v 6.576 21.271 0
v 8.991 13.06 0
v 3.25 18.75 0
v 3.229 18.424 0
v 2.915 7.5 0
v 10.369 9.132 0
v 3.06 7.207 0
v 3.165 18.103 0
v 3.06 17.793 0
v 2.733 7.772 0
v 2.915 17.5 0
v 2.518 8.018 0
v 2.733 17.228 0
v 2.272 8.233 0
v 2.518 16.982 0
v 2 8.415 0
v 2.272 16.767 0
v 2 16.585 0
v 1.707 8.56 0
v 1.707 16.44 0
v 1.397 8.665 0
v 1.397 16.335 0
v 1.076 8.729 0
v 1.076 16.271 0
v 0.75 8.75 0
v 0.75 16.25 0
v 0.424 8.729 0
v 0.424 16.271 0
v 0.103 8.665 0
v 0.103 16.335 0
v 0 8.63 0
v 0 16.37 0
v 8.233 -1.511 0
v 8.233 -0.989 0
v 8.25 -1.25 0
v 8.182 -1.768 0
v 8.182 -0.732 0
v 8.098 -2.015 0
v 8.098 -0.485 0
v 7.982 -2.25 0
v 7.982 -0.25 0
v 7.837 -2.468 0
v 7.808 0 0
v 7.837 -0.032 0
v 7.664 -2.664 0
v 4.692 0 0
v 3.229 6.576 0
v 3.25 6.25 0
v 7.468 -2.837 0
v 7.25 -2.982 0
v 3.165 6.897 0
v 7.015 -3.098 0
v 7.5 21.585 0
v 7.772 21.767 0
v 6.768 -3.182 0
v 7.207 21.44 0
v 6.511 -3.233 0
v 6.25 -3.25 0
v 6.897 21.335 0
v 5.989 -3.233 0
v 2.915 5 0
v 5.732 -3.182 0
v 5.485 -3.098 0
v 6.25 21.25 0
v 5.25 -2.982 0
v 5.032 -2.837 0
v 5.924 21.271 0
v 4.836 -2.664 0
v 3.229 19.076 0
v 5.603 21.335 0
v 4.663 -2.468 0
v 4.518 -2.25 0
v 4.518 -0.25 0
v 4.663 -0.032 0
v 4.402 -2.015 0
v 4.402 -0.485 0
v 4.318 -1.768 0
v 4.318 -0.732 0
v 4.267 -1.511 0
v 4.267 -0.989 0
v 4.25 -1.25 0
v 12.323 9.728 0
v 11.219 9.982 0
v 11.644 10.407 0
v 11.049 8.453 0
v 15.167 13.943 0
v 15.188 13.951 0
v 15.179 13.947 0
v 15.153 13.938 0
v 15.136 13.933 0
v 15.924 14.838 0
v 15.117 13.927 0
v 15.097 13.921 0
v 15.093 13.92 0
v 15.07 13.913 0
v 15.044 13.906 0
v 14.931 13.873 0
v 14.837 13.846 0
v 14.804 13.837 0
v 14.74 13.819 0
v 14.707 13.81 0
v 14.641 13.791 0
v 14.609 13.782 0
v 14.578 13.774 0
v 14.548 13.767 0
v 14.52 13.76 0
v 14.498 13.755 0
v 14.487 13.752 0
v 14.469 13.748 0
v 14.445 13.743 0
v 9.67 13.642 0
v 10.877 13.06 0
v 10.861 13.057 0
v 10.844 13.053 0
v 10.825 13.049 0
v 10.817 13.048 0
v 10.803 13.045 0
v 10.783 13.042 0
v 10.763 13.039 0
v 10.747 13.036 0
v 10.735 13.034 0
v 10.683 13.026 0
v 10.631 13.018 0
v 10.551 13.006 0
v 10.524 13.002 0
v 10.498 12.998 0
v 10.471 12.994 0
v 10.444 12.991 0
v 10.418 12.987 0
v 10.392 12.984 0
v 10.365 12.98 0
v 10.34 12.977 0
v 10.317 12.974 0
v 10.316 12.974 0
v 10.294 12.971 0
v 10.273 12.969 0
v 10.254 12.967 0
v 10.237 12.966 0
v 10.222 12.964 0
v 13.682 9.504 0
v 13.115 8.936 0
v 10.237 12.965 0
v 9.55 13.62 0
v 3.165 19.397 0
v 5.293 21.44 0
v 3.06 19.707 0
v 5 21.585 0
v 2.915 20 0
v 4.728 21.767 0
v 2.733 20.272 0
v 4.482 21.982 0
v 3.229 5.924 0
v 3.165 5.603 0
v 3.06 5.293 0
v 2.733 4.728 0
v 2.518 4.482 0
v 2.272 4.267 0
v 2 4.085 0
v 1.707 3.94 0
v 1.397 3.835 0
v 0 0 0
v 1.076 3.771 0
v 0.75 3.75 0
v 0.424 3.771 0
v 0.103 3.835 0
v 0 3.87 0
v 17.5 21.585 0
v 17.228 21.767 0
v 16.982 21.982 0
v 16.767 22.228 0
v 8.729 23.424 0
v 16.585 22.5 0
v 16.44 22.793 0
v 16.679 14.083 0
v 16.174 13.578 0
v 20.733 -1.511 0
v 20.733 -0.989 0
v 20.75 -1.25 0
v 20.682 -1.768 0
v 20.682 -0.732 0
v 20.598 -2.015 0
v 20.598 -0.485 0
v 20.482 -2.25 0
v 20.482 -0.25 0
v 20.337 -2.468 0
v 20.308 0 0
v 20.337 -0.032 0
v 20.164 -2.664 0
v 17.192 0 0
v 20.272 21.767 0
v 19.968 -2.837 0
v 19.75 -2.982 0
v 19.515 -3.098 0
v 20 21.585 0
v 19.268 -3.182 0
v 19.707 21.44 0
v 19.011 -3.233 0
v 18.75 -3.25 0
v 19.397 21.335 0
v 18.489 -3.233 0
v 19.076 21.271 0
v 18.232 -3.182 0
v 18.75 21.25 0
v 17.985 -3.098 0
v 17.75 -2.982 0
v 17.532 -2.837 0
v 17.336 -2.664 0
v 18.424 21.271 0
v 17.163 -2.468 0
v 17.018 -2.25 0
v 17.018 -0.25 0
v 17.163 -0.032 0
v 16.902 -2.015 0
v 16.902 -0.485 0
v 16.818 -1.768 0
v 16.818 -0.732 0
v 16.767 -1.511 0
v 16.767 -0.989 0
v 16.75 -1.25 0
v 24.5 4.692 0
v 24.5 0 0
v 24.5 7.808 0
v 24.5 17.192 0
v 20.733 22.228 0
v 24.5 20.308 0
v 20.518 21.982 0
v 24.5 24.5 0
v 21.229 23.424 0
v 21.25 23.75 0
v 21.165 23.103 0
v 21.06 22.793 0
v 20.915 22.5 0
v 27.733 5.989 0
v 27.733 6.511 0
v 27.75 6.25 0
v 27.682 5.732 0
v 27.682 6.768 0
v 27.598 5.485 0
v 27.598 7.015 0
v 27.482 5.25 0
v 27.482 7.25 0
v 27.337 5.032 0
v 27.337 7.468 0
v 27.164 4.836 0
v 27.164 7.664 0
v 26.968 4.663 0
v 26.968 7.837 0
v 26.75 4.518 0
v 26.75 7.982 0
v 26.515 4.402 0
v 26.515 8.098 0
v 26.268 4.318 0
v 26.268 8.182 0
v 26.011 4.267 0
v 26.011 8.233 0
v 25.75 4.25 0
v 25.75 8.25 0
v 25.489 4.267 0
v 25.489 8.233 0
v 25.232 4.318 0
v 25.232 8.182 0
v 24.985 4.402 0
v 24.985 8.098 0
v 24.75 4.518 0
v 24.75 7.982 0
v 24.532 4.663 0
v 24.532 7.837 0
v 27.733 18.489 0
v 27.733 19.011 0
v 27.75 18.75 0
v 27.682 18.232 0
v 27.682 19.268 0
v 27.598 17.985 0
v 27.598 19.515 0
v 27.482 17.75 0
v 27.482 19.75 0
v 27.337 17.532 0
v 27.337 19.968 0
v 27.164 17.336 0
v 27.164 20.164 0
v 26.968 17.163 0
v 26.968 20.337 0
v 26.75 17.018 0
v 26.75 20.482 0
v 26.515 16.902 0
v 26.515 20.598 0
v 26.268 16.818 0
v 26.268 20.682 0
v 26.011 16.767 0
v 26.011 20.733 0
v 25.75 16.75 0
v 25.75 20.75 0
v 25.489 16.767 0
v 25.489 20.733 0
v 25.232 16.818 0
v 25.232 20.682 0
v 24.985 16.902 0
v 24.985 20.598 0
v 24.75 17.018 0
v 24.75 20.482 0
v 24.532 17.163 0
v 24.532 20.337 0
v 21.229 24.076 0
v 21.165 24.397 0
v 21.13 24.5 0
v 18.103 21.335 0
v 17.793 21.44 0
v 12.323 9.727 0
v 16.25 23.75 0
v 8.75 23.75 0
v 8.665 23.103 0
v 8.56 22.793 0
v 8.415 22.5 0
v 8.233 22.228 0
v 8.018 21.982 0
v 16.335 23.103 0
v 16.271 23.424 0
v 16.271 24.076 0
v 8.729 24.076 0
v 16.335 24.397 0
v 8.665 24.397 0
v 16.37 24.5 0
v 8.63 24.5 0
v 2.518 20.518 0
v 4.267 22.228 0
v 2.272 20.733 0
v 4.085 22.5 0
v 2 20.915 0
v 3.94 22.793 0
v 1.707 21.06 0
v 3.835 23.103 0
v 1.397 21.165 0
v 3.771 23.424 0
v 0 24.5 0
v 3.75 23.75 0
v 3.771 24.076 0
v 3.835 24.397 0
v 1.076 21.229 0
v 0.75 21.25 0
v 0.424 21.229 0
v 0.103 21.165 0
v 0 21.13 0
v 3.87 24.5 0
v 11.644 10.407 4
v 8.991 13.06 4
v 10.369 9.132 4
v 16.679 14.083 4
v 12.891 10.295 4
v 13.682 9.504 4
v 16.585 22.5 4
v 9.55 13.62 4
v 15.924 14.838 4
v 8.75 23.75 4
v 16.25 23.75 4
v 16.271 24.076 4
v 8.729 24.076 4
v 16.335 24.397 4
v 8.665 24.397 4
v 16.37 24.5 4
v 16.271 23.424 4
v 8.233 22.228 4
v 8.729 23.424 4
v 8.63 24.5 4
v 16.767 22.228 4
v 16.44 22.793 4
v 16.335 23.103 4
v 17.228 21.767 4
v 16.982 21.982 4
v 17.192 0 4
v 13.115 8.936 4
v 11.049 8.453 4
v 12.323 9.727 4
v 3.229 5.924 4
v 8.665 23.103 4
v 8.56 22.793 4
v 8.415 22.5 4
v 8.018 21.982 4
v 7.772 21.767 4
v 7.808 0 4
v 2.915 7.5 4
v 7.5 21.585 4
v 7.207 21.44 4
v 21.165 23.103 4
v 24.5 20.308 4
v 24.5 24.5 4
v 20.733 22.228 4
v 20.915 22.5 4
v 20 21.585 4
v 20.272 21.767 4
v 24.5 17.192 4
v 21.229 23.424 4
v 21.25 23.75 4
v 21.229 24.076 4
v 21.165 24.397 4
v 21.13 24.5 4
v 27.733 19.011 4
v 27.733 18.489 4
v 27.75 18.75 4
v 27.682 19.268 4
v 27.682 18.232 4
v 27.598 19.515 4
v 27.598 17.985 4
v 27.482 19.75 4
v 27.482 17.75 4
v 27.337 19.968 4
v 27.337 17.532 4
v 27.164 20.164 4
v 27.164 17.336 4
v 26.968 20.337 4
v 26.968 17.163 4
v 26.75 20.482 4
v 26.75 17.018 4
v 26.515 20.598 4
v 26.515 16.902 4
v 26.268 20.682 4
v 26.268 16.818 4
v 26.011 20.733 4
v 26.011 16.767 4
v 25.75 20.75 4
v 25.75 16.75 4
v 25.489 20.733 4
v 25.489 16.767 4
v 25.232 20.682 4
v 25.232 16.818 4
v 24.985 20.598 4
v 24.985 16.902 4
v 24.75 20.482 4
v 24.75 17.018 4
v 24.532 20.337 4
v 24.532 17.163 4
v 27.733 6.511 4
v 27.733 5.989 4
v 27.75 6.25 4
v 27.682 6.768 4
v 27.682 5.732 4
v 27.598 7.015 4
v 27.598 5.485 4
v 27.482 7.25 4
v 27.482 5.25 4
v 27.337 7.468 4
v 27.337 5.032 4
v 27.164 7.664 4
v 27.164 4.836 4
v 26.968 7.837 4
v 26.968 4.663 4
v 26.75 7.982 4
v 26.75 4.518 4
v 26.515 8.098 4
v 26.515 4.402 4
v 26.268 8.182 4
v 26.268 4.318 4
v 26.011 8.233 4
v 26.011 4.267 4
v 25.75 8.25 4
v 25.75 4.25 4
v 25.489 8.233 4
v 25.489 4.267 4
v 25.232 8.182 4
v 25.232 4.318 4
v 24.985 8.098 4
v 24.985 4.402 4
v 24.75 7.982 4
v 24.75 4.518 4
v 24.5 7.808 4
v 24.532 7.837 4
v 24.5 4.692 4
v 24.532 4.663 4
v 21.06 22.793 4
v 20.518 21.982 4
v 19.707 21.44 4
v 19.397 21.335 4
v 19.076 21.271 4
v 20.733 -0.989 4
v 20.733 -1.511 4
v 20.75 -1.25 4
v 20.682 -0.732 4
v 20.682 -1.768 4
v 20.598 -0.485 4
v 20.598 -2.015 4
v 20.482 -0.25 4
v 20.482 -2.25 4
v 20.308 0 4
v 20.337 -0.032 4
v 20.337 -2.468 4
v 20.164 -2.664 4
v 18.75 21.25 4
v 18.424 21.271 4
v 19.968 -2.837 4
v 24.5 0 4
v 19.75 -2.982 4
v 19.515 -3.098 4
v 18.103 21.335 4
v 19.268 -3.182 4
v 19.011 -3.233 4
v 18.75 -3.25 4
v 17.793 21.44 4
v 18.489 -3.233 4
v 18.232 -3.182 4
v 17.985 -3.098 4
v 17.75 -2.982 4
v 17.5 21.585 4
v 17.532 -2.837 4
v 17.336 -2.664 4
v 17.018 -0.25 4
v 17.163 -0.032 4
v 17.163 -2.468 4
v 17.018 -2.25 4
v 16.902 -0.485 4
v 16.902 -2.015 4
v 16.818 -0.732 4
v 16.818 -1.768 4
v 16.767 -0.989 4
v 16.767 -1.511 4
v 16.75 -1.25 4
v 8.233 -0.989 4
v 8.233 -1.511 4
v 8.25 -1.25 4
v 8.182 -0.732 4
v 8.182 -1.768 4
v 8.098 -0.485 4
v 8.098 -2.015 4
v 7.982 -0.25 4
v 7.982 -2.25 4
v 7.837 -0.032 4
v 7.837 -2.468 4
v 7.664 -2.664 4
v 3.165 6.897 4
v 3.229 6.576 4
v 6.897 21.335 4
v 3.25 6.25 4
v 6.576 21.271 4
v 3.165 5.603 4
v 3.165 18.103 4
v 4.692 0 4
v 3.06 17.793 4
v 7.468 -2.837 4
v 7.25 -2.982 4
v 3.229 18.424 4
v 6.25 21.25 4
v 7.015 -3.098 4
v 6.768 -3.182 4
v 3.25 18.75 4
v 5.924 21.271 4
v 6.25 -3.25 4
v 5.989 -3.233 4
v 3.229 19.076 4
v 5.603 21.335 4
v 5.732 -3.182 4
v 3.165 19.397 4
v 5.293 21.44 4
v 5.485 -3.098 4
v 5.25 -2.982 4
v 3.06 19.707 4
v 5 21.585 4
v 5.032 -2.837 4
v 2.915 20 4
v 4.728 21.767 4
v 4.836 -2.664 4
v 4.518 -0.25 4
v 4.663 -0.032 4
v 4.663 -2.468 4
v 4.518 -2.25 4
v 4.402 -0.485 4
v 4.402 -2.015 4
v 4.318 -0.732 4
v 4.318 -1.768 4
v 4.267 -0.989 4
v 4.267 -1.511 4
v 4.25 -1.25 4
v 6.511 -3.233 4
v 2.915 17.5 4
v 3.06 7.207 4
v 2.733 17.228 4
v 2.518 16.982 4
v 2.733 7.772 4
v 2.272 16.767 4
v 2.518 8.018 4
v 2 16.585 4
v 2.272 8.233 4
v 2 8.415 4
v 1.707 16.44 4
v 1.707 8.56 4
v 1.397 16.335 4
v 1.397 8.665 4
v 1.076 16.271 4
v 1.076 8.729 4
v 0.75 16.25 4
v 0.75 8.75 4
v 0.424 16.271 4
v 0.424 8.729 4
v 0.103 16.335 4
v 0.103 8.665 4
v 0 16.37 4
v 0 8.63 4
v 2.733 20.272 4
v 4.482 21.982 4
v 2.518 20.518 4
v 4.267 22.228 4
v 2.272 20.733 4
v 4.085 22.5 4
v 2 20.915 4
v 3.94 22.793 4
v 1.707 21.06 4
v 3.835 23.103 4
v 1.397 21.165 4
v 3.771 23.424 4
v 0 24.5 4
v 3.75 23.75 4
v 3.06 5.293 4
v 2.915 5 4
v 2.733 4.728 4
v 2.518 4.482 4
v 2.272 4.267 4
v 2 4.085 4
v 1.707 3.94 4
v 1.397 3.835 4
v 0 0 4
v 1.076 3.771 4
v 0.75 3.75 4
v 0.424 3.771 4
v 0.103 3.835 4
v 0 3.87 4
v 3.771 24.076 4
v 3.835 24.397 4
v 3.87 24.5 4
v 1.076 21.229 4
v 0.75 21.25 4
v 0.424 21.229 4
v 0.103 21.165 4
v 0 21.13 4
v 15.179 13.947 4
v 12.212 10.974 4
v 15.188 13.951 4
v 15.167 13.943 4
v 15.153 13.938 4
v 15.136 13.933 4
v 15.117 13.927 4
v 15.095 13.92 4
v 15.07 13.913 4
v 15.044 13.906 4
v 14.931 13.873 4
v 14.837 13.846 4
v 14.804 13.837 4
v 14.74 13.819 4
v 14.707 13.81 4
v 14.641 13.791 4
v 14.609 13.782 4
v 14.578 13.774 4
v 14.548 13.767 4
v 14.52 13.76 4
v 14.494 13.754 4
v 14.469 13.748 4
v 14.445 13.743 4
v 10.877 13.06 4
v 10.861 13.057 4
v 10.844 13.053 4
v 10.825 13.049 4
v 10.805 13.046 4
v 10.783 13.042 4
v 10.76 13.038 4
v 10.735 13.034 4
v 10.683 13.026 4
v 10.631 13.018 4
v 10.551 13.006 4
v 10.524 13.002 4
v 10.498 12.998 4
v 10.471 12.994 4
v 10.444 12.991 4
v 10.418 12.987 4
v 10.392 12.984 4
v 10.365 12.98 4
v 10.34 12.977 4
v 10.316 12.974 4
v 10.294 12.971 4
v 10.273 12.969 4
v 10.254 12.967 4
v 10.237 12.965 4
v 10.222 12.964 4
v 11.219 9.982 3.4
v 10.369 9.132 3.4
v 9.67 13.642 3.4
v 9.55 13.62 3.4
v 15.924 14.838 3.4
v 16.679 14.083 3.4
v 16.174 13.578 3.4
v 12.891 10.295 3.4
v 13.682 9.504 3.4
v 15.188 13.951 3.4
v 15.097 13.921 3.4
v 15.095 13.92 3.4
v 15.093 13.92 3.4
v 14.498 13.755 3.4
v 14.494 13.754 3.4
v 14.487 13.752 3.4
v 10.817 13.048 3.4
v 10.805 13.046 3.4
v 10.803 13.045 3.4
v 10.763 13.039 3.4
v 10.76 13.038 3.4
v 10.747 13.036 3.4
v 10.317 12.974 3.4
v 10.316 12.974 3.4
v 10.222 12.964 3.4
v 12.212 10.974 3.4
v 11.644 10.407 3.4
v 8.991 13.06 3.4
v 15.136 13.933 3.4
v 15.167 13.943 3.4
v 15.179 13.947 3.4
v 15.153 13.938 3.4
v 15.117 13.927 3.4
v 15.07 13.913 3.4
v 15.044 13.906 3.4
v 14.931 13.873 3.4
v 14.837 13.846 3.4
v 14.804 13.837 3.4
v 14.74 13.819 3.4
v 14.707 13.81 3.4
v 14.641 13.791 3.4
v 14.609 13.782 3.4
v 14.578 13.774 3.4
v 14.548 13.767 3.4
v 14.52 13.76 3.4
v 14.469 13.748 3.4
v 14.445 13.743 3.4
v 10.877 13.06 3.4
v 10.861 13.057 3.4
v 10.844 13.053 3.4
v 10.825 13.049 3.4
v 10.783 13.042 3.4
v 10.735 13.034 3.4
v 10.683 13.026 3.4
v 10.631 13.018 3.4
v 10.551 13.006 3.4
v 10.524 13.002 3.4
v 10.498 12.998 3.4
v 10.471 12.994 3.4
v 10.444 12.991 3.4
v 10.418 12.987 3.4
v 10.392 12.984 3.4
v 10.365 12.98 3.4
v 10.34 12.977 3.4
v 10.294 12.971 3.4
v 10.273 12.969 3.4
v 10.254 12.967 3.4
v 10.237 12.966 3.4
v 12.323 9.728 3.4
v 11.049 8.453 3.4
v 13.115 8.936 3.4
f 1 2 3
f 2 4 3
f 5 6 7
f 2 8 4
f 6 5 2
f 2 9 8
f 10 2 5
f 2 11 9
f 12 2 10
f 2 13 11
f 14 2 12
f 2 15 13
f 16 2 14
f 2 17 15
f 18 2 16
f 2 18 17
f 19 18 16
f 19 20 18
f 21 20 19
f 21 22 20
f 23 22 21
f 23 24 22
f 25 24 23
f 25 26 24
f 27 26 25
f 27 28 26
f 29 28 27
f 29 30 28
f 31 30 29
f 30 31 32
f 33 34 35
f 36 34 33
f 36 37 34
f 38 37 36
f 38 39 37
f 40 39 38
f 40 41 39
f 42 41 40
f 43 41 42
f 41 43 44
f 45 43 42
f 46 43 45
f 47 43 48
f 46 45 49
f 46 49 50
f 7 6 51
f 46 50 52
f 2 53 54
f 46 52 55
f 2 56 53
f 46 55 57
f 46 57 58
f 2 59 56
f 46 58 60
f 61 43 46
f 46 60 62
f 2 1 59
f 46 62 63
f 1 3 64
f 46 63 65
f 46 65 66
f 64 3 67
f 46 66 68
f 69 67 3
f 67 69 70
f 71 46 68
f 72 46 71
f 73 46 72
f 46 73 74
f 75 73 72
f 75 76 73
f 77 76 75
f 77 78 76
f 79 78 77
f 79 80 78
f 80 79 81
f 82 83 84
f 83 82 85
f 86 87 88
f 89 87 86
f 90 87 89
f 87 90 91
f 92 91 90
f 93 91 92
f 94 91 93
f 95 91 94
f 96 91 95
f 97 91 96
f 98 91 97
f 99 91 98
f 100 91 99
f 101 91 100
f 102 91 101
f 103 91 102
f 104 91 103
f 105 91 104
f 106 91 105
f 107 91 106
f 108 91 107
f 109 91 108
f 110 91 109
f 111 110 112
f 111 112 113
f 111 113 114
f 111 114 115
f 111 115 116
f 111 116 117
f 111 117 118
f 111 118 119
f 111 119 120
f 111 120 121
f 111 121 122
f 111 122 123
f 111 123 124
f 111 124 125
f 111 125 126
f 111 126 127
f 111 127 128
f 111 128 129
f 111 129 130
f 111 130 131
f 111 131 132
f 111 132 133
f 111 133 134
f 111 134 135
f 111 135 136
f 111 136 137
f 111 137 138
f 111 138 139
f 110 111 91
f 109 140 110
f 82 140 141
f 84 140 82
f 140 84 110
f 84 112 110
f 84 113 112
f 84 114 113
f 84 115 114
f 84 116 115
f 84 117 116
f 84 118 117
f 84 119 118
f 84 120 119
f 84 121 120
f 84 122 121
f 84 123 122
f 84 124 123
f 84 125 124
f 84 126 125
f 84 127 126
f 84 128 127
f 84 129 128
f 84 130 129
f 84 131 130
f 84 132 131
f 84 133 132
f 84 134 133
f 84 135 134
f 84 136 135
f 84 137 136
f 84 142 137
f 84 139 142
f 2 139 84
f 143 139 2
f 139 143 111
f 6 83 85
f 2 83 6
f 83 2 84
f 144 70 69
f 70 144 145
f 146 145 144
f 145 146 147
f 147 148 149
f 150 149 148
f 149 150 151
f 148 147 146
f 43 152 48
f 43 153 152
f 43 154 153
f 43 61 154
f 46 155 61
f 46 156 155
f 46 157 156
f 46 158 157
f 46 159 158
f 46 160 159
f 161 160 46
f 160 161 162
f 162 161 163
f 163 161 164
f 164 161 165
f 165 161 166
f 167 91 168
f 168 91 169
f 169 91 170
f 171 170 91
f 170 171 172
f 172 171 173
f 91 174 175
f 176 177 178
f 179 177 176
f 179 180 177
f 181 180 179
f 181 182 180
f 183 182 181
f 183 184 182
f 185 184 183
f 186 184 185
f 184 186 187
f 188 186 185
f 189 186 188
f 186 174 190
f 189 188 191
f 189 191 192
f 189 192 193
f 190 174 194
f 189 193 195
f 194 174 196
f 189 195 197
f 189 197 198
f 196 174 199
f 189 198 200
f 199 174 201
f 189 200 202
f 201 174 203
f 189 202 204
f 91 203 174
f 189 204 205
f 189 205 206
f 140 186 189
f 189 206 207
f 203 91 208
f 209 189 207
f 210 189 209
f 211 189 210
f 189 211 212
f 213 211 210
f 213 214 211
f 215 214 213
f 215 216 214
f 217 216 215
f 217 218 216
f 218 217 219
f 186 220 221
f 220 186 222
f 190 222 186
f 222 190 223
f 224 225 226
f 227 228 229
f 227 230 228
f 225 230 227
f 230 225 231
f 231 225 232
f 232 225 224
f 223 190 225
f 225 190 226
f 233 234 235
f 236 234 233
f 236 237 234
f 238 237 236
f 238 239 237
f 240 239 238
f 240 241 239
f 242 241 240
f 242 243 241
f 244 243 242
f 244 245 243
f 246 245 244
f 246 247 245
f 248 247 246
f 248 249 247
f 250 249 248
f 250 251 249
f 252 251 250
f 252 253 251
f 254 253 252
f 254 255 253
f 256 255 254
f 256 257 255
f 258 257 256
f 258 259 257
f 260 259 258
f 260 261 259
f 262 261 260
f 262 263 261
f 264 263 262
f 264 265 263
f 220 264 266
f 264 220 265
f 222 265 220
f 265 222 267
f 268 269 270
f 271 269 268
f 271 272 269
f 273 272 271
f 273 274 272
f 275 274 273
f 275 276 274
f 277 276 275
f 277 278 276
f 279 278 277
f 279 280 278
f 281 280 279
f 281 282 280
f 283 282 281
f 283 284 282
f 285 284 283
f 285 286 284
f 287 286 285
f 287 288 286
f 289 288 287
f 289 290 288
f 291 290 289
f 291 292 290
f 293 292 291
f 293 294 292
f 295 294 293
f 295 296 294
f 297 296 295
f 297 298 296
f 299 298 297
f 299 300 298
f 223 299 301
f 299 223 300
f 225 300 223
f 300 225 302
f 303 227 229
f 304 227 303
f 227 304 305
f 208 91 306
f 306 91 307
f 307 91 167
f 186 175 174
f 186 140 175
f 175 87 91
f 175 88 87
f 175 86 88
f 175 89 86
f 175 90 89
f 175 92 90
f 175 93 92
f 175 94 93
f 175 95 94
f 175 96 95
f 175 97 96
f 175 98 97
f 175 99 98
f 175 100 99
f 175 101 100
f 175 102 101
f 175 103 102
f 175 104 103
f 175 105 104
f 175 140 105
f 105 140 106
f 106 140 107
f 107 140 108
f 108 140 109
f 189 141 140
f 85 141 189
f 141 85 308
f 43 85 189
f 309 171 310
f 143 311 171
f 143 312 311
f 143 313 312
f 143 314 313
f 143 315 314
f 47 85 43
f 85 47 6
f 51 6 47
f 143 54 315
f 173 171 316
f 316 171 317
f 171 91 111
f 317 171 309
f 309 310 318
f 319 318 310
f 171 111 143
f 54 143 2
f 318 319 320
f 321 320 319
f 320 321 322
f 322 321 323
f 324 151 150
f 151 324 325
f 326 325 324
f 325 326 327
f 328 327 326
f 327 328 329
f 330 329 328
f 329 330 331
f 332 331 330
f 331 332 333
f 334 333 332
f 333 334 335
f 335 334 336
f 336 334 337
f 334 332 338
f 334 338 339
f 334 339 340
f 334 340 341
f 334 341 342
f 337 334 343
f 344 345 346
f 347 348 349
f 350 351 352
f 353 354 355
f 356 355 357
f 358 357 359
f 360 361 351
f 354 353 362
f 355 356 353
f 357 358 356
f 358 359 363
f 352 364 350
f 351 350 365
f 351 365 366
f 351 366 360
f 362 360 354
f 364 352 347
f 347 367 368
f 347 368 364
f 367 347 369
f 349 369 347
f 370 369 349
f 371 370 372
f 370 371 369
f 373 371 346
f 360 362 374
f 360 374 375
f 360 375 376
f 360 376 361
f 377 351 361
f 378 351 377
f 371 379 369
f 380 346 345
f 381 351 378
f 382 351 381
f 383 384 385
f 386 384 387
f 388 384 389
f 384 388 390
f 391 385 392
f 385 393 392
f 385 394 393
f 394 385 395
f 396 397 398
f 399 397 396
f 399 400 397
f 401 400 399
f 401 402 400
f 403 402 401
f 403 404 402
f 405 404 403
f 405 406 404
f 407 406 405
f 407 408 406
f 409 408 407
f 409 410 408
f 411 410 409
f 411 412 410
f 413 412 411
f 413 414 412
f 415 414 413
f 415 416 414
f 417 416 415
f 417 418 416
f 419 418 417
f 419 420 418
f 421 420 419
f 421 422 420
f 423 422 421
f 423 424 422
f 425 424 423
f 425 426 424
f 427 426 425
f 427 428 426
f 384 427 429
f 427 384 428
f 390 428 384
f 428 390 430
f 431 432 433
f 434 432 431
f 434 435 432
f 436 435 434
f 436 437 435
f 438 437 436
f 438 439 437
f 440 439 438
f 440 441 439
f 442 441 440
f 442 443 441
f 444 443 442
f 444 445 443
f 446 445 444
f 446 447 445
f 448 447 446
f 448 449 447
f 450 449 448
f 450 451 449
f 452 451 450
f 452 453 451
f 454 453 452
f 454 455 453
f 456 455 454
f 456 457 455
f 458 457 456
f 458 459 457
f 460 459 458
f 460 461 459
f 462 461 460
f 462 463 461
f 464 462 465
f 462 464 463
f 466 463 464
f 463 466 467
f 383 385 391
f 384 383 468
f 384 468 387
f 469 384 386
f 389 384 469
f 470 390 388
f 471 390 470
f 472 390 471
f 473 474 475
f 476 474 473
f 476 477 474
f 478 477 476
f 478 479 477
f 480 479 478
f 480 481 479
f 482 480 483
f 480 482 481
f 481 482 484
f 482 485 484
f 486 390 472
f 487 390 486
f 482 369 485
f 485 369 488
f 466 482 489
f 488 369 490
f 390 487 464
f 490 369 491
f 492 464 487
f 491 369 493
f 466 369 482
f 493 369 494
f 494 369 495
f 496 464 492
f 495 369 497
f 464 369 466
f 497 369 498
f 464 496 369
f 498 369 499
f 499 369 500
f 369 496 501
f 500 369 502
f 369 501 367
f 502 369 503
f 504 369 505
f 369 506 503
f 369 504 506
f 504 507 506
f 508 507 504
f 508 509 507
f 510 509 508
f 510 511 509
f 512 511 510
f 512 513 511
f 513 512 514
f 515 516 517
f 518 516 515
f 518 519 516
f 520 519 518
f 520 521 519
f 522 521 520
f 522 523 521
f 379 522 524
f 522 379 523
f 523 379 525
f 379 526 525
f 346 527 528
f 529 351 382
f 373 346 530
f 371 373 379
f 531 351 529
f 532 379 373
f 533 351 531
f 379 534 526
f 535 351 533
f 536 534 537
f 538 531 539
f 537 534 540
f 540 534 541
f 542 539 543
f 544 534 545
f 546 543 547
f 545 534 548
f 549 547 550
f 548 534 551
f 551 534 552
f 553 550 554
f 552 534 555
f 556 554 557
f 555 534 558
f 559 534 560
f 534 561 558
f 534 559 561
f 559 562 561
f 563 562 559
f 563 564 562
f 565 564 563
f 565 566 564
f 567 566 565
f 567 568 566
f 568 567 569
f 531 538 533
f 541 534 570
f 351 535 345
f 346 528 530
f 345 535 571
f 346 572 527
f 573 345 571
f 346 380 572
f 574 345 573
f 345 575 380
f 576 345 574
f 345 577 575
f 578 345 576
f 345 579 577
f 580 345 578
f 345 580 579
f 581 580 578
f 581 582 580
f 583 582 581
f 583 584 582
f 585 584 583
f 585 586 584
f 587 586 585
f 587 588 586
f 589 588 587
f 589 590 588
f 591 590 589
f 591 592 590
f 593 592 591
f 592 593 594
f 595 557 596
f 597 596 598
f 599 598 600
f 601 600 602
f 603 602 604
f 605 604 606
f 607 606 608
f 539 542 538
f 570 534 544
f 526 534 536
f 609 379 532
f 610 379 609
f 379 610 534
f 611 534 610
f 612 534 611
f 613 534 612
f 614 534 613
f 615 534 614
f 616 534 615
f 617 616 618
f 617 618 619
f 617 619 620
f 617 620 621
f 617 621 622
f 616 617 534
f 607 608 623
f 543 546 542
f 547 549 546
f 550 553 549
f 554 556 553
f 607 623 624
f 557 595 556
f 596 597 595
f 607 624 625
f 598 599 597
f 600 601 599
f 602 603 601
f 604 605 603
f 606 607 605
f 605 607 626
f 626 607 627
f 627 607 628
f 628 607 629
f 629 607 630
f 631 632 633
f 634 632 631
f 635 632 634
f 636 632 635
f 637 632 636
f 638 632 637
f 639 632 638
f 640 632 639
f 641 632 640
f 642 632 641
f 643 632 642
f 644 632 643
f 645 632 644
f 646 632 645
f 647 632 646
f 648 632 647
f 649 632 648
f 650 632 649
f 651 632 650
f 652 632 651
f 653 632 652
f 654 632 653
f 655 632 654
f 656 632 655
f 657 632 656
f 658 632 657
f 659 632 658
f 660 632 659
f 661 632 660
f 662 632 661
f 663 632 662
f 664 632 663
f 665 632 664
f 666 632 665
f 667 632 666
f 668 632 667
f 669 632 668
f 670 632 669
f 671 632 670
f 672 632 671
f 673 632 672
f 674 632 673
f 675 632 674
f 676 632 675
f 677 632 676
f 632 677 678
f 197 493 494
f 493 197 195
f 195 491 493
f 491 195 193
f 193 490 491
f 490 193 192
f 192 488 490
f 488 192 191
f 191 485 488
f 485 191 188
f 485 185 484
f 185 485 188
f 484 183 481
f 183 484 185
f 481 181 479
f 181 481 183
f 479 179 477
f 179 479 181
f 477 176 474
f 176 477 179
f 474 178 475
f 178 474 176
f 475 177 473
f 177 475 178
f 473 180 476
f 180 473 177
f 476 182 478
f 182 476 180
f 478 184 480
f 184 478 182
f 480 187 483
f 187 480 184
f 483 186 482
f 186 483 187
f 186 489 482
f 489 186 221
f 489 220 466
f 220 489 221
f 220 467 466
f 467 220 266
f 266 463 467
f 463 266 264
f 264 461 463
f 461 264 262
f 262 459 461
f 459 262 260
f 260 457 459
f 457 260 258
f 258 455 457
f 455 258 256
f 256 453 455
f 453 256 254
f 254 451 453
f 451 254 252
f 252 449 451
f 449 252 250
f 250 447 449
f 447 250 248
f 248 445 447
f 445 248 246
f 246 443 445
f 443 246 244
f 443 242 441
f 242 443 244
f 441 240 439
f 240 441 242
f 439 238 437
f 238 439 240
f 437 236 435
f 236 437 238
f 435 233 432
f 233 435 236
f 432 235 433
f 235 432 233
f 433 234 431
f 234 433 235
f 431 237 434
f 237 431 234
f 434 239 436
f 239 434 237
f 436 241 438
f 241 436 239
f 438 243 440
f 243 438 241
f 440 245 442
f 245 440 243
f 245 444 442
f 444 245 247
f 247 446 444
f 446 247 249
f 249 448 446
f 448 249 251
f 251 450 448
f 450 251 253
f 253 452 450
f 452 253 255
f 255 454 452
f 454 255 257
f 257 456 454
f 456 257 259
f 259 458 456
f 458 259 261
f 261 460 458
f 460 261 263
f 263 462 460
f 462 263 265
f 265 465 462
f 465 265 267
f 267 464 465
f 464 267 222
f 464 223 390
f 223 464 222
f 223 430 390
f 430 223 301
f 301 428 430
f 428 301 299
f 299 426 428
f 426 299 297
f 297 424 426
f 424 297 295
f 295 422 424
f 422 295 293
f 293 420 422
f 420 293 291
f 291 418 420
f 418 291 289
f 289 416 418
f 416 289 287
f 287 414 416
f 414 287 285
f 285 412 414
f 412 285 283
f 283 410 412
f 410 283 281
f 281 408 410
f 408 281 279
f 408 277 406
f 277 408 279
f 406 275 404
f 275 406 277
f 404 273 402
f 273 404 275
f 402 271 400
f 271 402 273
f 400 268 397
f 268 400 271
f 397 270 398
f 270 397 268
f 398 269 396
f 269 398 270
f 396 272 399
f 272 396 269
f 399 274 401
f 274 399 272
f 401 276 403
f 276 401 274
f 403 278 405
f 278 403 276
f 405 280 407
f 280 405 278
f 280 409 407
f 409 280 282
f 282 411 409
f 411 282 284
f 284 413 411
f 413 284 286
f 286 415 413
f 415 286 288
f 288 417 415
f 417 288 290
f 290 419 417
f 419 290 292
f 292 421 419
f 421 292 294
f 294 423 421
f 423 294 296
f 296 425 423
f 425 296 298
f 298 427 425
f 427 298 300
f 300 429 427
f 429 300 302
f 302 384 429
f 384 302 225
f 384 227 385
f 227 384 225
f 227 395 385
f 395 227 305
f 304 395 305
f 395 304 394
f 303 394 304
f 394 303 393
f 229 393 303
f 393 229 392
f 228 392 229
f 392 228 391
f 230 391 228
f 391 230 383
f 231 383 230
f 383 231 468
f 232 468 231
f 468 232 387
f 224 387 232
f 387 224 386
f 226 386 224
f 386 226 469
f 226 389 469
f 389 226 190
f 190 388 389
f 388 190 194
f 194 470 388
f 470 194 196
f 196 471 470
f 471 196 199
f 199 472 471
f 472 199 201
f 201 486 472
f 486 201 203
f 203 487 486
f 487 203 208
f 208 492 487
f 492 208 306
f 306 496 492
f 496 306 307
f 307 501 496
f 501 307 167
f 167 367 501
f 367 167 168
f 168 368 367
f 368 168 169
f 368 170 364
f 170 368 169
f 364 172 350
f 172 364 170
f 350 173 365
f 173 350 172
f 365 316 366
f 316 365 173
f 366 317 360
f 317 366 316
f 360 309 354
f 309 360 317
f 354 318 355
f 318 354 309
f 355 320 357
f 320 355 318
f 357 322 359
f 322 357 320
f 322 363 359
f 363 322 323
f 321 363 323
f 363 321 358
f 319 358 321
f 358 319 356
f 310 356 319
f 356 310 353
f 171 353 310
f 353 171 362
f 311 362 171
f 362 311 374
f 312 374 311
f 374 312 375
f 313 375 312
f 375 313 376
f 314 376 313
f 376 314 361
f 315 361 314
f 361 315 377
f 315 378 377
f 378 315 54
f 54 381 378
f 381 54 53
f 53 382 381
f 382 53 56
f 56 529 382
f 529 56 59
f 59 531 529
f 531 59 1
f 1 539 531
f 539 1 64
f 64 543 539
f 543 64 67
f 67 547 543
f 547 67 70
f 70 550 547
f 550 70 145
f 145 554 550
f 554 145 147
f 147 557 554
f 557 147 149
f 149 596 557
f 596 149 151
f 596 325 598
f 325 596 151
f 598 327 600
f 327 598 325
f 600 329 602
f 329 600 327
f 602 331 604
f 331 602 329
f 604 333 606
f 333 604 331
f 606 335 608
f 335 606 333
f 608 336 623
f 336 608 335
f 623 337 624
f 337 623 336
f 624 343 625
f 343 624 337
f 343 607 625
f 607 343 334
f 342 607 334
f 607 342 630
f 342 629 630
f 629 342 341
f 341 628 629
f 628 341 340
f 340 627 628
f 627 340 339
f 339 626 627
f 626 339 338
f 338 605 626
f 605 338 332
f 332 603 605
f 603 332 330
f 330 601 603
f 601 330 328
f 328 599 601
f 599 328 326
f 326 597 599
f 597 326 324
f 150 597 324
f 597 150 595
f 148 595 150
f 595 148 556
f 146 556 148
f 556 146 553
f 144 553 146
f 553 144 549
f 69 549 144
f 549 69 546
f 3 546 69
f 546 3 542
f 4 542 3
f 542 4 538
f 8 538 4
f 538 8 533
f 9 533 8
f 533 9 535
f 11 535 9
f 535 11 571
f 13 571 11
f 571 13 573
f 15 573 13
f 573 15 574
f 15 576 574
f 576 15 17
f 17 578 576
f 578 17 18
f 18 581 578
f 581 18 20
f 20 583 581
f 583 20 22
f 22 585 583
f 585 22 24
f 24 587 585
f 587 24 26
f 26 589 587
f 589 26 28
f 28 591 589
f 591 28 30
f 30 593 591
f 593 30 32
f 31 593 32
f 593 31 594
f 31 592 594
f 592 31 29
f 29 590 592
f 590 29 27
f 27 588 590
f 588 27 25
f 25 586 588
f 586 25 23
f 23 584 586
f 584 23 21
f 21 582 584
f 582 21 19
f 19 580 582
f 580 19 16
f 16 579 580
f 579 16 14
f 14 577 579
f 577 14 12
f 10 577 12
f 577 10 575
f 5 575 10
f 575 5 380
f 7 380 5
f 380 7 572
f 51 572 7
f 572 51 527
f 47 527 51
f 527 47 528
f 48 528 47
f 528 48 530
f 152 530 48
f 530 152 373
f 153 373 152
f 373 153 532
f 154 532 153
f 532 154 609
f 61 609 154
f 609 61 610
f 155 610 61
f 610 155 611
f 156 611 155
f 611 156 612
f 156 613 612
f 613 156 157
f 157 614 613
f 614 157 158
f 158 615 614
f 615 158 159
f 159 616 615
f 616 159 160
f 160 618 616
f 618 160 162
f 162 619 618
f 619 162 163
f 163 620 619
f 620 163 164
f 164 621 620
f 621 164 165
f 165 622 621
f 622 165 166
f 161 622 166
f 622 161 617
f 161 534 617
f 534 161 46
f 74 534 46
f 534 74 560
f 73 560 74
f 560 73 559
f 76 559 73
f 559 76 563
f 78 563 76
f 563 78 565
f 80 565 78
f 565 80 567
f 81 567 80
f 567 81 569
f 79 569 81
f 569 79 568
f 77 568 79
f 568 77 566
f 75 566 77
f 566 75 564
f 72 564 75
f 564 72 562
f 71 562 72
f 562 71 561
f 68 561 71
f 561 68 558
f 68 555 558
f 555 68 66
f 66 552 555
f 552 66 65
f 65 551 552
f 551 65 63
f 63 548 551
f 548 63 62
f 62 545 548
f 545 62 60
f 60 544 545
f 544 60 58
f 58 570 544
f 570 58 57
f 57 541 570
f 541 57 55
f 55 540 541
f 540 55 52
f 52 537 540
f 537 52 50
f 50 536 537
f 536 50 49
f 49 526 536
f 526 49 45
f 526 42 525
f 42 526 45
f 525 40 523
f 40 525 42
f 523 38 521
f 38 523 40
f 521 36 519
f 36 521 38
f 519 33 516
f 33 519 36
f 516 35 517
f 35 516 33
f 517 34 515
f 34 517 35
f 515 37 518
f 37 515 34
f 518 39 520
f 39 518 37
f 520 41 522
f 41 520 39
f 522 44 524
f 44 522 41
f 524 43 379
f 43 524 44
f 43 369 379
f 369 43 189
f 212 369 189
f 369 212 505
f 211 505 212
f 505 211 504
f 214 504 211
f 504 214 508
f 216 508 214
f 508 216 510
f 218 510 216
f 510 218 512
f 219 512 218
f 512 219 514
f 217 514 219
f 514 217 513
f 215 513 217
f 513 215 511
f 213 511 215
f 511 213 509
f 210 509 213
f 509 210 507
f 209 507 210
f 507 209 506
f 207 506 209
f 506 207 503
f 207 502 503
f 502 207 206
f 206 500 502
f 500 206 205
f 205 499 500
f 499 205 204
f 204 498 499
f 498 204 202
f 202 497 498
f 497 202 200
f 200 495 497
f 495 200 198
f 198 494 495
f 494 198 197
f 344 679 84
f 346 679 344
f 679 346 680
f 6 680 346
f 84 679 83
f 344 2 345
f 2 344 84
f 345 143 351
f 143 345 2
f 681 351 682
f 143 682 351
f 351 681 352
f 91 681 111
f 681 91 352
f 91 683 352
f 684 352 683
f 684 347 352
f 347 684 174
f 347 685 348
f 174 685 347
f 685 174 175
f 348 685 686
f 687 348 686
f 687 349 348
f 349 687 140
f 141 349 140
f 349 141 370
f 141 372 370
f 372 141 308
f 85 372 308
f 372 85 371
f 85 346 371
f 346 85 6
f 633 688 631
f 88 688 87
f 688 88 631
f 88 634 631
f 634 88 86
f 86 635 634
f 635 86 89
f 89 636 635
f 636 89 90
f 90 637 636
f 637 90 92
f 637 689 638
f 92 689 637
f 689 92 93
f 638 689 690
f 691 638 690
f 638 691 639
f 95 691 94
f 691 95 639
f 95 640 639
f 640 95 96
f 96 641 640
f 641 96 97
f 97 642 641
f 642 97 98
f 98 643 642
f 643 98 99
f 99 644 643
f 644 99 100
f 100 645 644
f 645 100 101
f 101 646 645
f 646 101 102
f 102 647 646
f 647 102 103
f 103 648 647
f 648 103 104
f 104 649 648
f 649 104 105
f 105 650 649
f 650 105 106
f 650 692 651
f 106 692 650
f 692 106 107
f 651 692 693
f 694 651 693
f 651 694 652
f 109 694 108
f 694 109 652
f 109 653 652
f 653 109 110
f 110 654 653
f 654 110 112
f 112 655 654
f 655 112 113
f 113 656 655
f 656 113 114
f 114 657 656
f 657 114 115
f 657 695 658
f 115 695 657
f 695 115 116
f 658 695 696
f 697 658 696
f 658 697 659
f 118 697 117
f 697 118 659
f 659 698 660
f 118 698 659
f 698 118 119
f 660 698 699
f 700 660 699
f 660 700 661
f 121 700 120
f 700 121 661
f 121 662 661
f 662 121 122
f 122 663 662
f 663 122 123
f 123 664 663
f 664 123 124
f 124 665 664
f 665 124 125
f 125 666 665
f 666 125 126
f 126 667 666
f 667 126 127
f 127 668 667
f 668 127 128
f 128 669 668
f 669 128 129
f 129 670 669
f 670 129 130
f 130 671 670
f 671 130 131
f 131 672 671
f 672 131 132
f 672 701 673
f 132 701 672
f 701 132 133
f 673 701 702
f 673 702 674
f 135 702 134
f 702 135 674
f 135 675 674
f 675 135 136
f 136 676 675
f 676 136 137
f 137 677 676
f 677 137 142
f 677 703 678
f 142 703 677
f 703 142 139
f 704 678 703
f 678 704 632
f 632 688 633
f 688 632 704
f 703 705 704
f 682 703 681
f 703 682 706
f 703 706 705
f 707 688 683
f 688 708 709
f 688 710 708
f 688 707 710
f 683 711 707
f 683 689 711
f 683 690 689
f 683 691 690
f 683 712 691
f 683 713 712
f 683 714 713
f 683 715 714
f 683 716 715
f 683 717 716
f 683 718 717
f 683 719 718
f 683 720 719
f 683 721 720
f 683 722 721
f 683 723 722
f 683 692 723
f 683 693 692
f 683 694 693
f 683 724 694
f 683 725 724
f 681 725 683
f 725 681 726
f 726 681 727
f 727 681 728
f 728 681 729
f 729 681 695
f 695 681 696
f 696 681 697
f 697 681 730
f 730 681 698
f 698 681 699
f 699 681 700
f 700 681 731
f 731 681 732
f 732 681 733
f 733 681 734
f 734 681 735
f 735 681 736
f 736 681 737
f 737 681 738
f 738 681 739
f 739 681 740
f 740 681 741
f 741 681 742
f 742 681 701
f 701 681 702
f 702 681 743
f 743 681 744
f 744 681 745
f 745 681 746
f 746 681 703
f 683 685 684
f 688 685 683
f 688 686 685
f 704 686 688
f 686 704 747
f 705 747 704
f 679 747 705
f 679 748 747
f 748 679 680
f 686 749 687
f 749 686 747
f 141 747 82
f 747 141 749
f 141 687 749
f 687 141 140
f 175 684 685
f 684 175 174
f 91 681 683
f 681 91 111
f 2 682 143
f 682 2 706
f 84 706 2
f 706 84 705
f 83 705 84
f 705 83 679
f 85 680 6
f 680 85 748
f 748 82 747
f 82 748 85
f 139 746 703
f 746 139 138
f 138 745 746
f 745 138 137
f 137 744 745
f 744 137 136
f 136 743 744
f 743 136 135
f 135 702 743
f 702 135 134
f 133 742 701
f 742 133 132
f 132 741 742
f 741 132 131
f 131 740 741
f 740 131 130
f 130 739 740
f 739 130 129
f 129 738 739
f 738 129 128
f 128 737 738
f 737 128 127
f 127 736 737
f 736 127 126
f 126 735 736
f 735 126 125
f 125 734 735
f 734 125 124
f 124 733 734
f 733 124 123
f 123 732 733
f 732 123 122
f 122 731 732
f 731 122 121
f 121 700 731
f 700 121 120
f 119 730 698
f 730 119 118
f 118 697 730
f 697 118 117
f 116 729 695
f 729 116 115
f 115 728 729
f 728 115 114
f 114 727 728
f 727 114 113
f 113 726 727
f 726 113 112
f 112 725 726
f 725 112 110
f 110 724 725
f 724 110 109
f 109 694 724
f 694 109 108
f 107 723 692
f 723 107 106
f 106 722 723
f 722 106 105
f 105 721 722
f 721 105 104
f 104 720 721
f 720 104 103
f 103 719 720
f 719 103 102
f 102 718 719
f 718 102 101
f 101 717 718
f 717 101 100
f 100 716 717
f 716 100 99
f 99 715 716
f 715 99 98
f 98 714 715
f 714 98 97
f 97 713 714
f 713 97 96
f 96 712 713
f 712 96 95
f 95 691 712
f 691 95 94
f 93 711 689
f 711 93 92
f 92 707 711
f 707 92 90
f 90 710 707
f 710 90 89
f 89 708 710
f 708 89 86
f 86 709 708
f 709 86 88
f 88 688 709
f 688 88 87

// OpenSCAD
only_one_piece = "YES";  //  [YES,NO]
same_side = "YES";  //  [YES,NO]

piece_side_length = 25;
// for n x n multiplication puzzle
n = 9; // [1:9]
spacing = 0.5;

/* [IF_ONLY_ONE_PIECE_ENABLED] */

number_for_one_piece = 4; 
flat_sides = "NONE"; // [NONE, TOP_RIGHT, BOTTOM_RIGHT, TOP_LEFT, BOTTOM_LEFT, TOP_SIDES, BOTTOM_SIDES, RIGHT_SIDES, LEFT_SIDES]

// Create a puzzle piece.
//
// Parameters: 
//     side_length - the length of the piece.
//     spacing - a small space between pieces to avoid overlaping while printing.
//     same_side - whether the piece has the same side.
module puzzle_piece(side_length, spacing, same_side = true) {
	$fn = 48;

	circle_radius = side_length / 10;
	half_circle_radius = circle_radius / 2;
	side_length_div_4 = side_length / 4;
	bulge_circle_radius = circle_radius - spacing;

	difference() {
		square(side_length - spacing);
		
		// left
		translate([half_circle_radius - spacing, side_length_div_4 , 0]) 
			circle(circle_radius);
		translate([half_circle_radius - spacing, side_length_div_4 * 3, 0]) 
			circle(circle_radius);
			
		// top
		if(same_side) {
			translate([side_length_div_4, side_length - half_circle_radius, 0]) 
				circle(circle_radius);
		
			translate([side_length_div_4 * 3, side_length - half_circle_radius, 0]) 
				circle(circle_radius);		
		} else {
			translate([side_length_div_4 * 2, side_length - half_circle_radius, 0]) 
				circle(circle_radius * 1.5);
		}
	}

	// right
	translate([side_length + half_circle_radius - spacing, side_length_div_4, 0]) 
		circle(bulge_circle_radius);
	translate([side_length + half_circle_radius - spacing, side_length_div_4 * 3, 0]) 
		circle(bulge_circle_radius);

	// bottom
	if(same_side) {
		translate([side_length_div_4, -half_circle_radius, 0]) 
			circle(bulge_circle_radius);
		translate([side_length_div_4 * 3, -half_circle_radius, 0]) 
			circle(bulge_circle_radius);
	} else {
		translate([side_length_div_4 * 2, -half_circle_radius, 0]) 
			circle(bulge_circle_radius * 1.5);	
	}
}

// Create a puzzle piece with a text.
//
// Parameters: 
//     side_length - the length of the piece.
//     text - a text shown on the piece.
//     spacing - a small space between pieces to avoid overlaping while printing.
//     same_side - whether the piece has the same side.
module puzzle_piece_with_text(side_length, text, spacing, same_side = true) {
    half_side_length = side_length / 2;
	
    difference() {
		puzzle_piece(side_length, spacing, same_side);
		translate([half_side_length, half_side_length, 0]) 
			rotate(-45) 
			     text(text, size = side_length / 3, 
					 halign = "center", valign = "center");
	}
}

// Create a multiplication_puzzle.
//
// Parameters: 
//     xs - the amount of pieces in x direction.
//     ys - the amount of pieces in y direction.
//     piece_side_length - the length of a piece.
//     spacing - a small space between pieces to avoid overlaping while printing.
//     same_side - whether the piece has the same side.
module multiplication_puzzle(xs, ys, piece_side_length, spacing, same_side = true) {
    $fn = 48;
	circle_radius = piece_side_length / 10;
	half_circle_radius = circle_radius / 2;
	side_length_div_4 = piece_side_length / 4;
	
	intersection() {
		union() for(x = [0 : xs - 1]) {
			for(y = [0 : ys - 1]) {
			    r = (x + 1) * (y + 1);
				linear_extrude(r) union() {
					translate([piece_side_length * x, piece_side_length * y, 0]) 
						puzzle_piece_with_text(piece_side_length, str(r), spacing, same_side);
						
					if(x == 0) {
						translate([half_circle_radius, side_length_div_4 + piece_side_length * y, 0]) 
							circle(circle_radius);
						translate([half_circle_radius, side_length_div_4 * 3 + piece_side_length * y, 0]) 
							circle(circle_radius);			
					}
					if(y == ys - 1) {
					    if(same_side) {
							translate([side_length_div_4 + piece_side_length * x, piece_side_length * (y + 1) - half_circle_radius, 0]) 
								circle(circle_radius);
							translate([side_length_div_4 * 3 + piece_side_length * x, piece_side_length * (y + 1) - half_circle_radius, 0]) 
								circle(circle_radius);	
						} else {
							translate([side_length_div_4 * 2 + piece_side_length * x, piece_side_length * (y + 1) - half_circle_radius, 0]) circle(circle_radius * 1.5);						
						}
					}
				}
                linear_extrude(r - 0.6) 
					translate([piece_side_length * x, piece_side_length * y, 0]) 
					    puzzle_piece(piece_side_length, spacing, same_side);
			}
		}
		
		linear_extrude(81) square([piece_side_length * xs - spacing, piece_side_length * ys - spacing]);
	}
}


module only_one_piece(n, piece_side_length, number_for_one_piece, spacing, same_side = true, flat_sides = "NONE") {
    $fn = 48;
    circle_radius = piece_side_length / 10;
    half_circle_radius = circle_radius / 2;
    side_length_div_4 = piece_side_length / 4;    
    
    linear_extrude(number_for_one_piece) union() {

        if(flat_sides == "NONE") {
            puzzle_piece_with_text(piece_side_length, str(number_for_one_piece), spacing, same_side = (same_side == "YES"));
        } else if(flat_sides == "BOTTOM_RIGHT") {
            intersection() {
                puzzle_piece_with_text(piece_side_length, str(number_for_one_piece), spacing, same_side = (same_side == "YES")); 
                
                square([piece_side_length * 2, piece_side_length - spacing]);
            }
        } else if(flat_sides == "BOTTOM_LEFT") {
            intersection() {
                union() {
                    puzzle_piece_with_text(piece_side_length, str(number_for_one_piece), spacing, same_side = (same_side == "YES"));   
        

                    translate([half_circle_radius - spacing, side_length_div_4, 0]) 
                        circle(circle_radius);
                    translate([half_circle_radius - spacing, side_length_div_4 * 3, 0]) 
                        circle(circle_radius);
                }                    

                 translate([0, -side_length_div_4, 0]) square([piece_side_length * 2, piece_side_length * 2]);
            }             
        } else if(flat_sides == "TOP_RIGHT") {
            intersection() {
                puzzle_piece_with_text(piece_side_length, str(number_for_one_piece), spacing, same_side = (same_side == "YES"));   
                 translate([0, -side_length_div_4, 0]) square([piece_side_length - spacing, piece_side_length * 2]);
            }
        } else if(flat_sides == "TOP_LEFT") {
            intersection() {
                 union() {
                     puzzle_piece_with_text(piece_side_length, str(number_for_one_piece), spacing, same_side = (same_side == "YES"));   
                     
                    translate([side_length_div_4, piece_side_length -half_circle_radius, 0]) 
                        circle(circle_radius);
                        
                    translate([side_length_div_4 * 3, piece_side_length -half_circle_radius, 0]) 
                        circle(circle_radius);
                }
                translate([0, -piece_side_length - spacing, 0]) square([piece_side_length * 2, piece_side_length * 2]);
            }
        } else if(flat_sides == "BOTTOM_SIDES") {
             intersection() {
                union() {
                    puzzle_piece_with_text(piece_side_length, str(number_for_one_piece), spacing, same_side = (same_side == "YES"));  
                    
                    translate([half_circle_radius - spacing, side_length_div_4, 0]) 
                        circle(circle_radius);
                    translate([half_circle_radius - spacing, side_length_div_4 * 3, 0]) 
                        circle(circle_radius);
                }
                square([piece_side_length * 2, piece_side_length * 2]);
            }
        } else if(flat_sides == "TOP_SIDES") {
            intersection() {
                union() {
                    puzzle_piece_with_text(piece_side_length, str(number_for_one_piece), spacing, same_side = (same_side == "YES"));  
                    translate([side_length_div_4, piece_side_length -half_circle_radius, 0]) 
                        circle(circle_radius);
                        
                    translate([side_length_div_4 * 3, piece_side_length -half_circle_radius, 0]) 
                        circle(circle_radius);
               }
               translate([0, -piece_side_length - spacing, 0]) 
                   square([piece_side_length - spacing, piece_side_length * 2]);
           }            
        } else if(flat_sides == "RIGHT_SIDES") {
            intersection() {
               puzzle_piece_with_text(piece_side_length, str(number_for_one_piece), spacing, same_side = (same_side == "YES"));     
               square([piece_side_length - spacing, piece_side_length]);
            }                   
        } else if(flat_sides == "LEFT_SIDES") {
            intersection() {
                union() {
                    puzzle_piece_with_text(piece_side_length, str(number_for_one_piece), spacing, same_side = (same_side == "YES"));  
                    
                    translate([side_length_div_4, piece_side_length -half_circle_radius, 0]) 
                        circle(circle_radius);
                    translate([side_length_div_4 * 3, piece_side_length -half_circle_radius, 0]) 
                        circle(circle_radius);
                        
                    translate([half_circle_radius - spacing, side_length_div_4, 0]) 
                        circle(circle_radius);
                    translate([half_circle_radius - spacing, side_length_div_4 * 3, 0]) 
                        circle(circle_radius);                        
               }    
               translate([0, -piece_side_length - spacing, 0]) square([piece_side_length * 2, piece_side_length * 2]);
            }                   
        }
        
    }    
    
    half_side_length = piece_side_length / 2;
    linear_extrude(number_for_one_piece - 0.6) difference() {
		translate([half_side_length, half_side_length, 0]) 
			rotate(-45) 
			     text(str(number_for_one_piece), size = piece_side_length / 3, 
					 halign = "center", valign = "center");
	}
}

if(only_one_piece == "YES") {
    only_one_piece(n, piece_side_length, number_for_one_piece, spacing, same_side, flat_sides);
}
else {
    multiplication_puzzle(n, n, piece_side_length, spacing, same_side = (same_side == "YES"));
}
